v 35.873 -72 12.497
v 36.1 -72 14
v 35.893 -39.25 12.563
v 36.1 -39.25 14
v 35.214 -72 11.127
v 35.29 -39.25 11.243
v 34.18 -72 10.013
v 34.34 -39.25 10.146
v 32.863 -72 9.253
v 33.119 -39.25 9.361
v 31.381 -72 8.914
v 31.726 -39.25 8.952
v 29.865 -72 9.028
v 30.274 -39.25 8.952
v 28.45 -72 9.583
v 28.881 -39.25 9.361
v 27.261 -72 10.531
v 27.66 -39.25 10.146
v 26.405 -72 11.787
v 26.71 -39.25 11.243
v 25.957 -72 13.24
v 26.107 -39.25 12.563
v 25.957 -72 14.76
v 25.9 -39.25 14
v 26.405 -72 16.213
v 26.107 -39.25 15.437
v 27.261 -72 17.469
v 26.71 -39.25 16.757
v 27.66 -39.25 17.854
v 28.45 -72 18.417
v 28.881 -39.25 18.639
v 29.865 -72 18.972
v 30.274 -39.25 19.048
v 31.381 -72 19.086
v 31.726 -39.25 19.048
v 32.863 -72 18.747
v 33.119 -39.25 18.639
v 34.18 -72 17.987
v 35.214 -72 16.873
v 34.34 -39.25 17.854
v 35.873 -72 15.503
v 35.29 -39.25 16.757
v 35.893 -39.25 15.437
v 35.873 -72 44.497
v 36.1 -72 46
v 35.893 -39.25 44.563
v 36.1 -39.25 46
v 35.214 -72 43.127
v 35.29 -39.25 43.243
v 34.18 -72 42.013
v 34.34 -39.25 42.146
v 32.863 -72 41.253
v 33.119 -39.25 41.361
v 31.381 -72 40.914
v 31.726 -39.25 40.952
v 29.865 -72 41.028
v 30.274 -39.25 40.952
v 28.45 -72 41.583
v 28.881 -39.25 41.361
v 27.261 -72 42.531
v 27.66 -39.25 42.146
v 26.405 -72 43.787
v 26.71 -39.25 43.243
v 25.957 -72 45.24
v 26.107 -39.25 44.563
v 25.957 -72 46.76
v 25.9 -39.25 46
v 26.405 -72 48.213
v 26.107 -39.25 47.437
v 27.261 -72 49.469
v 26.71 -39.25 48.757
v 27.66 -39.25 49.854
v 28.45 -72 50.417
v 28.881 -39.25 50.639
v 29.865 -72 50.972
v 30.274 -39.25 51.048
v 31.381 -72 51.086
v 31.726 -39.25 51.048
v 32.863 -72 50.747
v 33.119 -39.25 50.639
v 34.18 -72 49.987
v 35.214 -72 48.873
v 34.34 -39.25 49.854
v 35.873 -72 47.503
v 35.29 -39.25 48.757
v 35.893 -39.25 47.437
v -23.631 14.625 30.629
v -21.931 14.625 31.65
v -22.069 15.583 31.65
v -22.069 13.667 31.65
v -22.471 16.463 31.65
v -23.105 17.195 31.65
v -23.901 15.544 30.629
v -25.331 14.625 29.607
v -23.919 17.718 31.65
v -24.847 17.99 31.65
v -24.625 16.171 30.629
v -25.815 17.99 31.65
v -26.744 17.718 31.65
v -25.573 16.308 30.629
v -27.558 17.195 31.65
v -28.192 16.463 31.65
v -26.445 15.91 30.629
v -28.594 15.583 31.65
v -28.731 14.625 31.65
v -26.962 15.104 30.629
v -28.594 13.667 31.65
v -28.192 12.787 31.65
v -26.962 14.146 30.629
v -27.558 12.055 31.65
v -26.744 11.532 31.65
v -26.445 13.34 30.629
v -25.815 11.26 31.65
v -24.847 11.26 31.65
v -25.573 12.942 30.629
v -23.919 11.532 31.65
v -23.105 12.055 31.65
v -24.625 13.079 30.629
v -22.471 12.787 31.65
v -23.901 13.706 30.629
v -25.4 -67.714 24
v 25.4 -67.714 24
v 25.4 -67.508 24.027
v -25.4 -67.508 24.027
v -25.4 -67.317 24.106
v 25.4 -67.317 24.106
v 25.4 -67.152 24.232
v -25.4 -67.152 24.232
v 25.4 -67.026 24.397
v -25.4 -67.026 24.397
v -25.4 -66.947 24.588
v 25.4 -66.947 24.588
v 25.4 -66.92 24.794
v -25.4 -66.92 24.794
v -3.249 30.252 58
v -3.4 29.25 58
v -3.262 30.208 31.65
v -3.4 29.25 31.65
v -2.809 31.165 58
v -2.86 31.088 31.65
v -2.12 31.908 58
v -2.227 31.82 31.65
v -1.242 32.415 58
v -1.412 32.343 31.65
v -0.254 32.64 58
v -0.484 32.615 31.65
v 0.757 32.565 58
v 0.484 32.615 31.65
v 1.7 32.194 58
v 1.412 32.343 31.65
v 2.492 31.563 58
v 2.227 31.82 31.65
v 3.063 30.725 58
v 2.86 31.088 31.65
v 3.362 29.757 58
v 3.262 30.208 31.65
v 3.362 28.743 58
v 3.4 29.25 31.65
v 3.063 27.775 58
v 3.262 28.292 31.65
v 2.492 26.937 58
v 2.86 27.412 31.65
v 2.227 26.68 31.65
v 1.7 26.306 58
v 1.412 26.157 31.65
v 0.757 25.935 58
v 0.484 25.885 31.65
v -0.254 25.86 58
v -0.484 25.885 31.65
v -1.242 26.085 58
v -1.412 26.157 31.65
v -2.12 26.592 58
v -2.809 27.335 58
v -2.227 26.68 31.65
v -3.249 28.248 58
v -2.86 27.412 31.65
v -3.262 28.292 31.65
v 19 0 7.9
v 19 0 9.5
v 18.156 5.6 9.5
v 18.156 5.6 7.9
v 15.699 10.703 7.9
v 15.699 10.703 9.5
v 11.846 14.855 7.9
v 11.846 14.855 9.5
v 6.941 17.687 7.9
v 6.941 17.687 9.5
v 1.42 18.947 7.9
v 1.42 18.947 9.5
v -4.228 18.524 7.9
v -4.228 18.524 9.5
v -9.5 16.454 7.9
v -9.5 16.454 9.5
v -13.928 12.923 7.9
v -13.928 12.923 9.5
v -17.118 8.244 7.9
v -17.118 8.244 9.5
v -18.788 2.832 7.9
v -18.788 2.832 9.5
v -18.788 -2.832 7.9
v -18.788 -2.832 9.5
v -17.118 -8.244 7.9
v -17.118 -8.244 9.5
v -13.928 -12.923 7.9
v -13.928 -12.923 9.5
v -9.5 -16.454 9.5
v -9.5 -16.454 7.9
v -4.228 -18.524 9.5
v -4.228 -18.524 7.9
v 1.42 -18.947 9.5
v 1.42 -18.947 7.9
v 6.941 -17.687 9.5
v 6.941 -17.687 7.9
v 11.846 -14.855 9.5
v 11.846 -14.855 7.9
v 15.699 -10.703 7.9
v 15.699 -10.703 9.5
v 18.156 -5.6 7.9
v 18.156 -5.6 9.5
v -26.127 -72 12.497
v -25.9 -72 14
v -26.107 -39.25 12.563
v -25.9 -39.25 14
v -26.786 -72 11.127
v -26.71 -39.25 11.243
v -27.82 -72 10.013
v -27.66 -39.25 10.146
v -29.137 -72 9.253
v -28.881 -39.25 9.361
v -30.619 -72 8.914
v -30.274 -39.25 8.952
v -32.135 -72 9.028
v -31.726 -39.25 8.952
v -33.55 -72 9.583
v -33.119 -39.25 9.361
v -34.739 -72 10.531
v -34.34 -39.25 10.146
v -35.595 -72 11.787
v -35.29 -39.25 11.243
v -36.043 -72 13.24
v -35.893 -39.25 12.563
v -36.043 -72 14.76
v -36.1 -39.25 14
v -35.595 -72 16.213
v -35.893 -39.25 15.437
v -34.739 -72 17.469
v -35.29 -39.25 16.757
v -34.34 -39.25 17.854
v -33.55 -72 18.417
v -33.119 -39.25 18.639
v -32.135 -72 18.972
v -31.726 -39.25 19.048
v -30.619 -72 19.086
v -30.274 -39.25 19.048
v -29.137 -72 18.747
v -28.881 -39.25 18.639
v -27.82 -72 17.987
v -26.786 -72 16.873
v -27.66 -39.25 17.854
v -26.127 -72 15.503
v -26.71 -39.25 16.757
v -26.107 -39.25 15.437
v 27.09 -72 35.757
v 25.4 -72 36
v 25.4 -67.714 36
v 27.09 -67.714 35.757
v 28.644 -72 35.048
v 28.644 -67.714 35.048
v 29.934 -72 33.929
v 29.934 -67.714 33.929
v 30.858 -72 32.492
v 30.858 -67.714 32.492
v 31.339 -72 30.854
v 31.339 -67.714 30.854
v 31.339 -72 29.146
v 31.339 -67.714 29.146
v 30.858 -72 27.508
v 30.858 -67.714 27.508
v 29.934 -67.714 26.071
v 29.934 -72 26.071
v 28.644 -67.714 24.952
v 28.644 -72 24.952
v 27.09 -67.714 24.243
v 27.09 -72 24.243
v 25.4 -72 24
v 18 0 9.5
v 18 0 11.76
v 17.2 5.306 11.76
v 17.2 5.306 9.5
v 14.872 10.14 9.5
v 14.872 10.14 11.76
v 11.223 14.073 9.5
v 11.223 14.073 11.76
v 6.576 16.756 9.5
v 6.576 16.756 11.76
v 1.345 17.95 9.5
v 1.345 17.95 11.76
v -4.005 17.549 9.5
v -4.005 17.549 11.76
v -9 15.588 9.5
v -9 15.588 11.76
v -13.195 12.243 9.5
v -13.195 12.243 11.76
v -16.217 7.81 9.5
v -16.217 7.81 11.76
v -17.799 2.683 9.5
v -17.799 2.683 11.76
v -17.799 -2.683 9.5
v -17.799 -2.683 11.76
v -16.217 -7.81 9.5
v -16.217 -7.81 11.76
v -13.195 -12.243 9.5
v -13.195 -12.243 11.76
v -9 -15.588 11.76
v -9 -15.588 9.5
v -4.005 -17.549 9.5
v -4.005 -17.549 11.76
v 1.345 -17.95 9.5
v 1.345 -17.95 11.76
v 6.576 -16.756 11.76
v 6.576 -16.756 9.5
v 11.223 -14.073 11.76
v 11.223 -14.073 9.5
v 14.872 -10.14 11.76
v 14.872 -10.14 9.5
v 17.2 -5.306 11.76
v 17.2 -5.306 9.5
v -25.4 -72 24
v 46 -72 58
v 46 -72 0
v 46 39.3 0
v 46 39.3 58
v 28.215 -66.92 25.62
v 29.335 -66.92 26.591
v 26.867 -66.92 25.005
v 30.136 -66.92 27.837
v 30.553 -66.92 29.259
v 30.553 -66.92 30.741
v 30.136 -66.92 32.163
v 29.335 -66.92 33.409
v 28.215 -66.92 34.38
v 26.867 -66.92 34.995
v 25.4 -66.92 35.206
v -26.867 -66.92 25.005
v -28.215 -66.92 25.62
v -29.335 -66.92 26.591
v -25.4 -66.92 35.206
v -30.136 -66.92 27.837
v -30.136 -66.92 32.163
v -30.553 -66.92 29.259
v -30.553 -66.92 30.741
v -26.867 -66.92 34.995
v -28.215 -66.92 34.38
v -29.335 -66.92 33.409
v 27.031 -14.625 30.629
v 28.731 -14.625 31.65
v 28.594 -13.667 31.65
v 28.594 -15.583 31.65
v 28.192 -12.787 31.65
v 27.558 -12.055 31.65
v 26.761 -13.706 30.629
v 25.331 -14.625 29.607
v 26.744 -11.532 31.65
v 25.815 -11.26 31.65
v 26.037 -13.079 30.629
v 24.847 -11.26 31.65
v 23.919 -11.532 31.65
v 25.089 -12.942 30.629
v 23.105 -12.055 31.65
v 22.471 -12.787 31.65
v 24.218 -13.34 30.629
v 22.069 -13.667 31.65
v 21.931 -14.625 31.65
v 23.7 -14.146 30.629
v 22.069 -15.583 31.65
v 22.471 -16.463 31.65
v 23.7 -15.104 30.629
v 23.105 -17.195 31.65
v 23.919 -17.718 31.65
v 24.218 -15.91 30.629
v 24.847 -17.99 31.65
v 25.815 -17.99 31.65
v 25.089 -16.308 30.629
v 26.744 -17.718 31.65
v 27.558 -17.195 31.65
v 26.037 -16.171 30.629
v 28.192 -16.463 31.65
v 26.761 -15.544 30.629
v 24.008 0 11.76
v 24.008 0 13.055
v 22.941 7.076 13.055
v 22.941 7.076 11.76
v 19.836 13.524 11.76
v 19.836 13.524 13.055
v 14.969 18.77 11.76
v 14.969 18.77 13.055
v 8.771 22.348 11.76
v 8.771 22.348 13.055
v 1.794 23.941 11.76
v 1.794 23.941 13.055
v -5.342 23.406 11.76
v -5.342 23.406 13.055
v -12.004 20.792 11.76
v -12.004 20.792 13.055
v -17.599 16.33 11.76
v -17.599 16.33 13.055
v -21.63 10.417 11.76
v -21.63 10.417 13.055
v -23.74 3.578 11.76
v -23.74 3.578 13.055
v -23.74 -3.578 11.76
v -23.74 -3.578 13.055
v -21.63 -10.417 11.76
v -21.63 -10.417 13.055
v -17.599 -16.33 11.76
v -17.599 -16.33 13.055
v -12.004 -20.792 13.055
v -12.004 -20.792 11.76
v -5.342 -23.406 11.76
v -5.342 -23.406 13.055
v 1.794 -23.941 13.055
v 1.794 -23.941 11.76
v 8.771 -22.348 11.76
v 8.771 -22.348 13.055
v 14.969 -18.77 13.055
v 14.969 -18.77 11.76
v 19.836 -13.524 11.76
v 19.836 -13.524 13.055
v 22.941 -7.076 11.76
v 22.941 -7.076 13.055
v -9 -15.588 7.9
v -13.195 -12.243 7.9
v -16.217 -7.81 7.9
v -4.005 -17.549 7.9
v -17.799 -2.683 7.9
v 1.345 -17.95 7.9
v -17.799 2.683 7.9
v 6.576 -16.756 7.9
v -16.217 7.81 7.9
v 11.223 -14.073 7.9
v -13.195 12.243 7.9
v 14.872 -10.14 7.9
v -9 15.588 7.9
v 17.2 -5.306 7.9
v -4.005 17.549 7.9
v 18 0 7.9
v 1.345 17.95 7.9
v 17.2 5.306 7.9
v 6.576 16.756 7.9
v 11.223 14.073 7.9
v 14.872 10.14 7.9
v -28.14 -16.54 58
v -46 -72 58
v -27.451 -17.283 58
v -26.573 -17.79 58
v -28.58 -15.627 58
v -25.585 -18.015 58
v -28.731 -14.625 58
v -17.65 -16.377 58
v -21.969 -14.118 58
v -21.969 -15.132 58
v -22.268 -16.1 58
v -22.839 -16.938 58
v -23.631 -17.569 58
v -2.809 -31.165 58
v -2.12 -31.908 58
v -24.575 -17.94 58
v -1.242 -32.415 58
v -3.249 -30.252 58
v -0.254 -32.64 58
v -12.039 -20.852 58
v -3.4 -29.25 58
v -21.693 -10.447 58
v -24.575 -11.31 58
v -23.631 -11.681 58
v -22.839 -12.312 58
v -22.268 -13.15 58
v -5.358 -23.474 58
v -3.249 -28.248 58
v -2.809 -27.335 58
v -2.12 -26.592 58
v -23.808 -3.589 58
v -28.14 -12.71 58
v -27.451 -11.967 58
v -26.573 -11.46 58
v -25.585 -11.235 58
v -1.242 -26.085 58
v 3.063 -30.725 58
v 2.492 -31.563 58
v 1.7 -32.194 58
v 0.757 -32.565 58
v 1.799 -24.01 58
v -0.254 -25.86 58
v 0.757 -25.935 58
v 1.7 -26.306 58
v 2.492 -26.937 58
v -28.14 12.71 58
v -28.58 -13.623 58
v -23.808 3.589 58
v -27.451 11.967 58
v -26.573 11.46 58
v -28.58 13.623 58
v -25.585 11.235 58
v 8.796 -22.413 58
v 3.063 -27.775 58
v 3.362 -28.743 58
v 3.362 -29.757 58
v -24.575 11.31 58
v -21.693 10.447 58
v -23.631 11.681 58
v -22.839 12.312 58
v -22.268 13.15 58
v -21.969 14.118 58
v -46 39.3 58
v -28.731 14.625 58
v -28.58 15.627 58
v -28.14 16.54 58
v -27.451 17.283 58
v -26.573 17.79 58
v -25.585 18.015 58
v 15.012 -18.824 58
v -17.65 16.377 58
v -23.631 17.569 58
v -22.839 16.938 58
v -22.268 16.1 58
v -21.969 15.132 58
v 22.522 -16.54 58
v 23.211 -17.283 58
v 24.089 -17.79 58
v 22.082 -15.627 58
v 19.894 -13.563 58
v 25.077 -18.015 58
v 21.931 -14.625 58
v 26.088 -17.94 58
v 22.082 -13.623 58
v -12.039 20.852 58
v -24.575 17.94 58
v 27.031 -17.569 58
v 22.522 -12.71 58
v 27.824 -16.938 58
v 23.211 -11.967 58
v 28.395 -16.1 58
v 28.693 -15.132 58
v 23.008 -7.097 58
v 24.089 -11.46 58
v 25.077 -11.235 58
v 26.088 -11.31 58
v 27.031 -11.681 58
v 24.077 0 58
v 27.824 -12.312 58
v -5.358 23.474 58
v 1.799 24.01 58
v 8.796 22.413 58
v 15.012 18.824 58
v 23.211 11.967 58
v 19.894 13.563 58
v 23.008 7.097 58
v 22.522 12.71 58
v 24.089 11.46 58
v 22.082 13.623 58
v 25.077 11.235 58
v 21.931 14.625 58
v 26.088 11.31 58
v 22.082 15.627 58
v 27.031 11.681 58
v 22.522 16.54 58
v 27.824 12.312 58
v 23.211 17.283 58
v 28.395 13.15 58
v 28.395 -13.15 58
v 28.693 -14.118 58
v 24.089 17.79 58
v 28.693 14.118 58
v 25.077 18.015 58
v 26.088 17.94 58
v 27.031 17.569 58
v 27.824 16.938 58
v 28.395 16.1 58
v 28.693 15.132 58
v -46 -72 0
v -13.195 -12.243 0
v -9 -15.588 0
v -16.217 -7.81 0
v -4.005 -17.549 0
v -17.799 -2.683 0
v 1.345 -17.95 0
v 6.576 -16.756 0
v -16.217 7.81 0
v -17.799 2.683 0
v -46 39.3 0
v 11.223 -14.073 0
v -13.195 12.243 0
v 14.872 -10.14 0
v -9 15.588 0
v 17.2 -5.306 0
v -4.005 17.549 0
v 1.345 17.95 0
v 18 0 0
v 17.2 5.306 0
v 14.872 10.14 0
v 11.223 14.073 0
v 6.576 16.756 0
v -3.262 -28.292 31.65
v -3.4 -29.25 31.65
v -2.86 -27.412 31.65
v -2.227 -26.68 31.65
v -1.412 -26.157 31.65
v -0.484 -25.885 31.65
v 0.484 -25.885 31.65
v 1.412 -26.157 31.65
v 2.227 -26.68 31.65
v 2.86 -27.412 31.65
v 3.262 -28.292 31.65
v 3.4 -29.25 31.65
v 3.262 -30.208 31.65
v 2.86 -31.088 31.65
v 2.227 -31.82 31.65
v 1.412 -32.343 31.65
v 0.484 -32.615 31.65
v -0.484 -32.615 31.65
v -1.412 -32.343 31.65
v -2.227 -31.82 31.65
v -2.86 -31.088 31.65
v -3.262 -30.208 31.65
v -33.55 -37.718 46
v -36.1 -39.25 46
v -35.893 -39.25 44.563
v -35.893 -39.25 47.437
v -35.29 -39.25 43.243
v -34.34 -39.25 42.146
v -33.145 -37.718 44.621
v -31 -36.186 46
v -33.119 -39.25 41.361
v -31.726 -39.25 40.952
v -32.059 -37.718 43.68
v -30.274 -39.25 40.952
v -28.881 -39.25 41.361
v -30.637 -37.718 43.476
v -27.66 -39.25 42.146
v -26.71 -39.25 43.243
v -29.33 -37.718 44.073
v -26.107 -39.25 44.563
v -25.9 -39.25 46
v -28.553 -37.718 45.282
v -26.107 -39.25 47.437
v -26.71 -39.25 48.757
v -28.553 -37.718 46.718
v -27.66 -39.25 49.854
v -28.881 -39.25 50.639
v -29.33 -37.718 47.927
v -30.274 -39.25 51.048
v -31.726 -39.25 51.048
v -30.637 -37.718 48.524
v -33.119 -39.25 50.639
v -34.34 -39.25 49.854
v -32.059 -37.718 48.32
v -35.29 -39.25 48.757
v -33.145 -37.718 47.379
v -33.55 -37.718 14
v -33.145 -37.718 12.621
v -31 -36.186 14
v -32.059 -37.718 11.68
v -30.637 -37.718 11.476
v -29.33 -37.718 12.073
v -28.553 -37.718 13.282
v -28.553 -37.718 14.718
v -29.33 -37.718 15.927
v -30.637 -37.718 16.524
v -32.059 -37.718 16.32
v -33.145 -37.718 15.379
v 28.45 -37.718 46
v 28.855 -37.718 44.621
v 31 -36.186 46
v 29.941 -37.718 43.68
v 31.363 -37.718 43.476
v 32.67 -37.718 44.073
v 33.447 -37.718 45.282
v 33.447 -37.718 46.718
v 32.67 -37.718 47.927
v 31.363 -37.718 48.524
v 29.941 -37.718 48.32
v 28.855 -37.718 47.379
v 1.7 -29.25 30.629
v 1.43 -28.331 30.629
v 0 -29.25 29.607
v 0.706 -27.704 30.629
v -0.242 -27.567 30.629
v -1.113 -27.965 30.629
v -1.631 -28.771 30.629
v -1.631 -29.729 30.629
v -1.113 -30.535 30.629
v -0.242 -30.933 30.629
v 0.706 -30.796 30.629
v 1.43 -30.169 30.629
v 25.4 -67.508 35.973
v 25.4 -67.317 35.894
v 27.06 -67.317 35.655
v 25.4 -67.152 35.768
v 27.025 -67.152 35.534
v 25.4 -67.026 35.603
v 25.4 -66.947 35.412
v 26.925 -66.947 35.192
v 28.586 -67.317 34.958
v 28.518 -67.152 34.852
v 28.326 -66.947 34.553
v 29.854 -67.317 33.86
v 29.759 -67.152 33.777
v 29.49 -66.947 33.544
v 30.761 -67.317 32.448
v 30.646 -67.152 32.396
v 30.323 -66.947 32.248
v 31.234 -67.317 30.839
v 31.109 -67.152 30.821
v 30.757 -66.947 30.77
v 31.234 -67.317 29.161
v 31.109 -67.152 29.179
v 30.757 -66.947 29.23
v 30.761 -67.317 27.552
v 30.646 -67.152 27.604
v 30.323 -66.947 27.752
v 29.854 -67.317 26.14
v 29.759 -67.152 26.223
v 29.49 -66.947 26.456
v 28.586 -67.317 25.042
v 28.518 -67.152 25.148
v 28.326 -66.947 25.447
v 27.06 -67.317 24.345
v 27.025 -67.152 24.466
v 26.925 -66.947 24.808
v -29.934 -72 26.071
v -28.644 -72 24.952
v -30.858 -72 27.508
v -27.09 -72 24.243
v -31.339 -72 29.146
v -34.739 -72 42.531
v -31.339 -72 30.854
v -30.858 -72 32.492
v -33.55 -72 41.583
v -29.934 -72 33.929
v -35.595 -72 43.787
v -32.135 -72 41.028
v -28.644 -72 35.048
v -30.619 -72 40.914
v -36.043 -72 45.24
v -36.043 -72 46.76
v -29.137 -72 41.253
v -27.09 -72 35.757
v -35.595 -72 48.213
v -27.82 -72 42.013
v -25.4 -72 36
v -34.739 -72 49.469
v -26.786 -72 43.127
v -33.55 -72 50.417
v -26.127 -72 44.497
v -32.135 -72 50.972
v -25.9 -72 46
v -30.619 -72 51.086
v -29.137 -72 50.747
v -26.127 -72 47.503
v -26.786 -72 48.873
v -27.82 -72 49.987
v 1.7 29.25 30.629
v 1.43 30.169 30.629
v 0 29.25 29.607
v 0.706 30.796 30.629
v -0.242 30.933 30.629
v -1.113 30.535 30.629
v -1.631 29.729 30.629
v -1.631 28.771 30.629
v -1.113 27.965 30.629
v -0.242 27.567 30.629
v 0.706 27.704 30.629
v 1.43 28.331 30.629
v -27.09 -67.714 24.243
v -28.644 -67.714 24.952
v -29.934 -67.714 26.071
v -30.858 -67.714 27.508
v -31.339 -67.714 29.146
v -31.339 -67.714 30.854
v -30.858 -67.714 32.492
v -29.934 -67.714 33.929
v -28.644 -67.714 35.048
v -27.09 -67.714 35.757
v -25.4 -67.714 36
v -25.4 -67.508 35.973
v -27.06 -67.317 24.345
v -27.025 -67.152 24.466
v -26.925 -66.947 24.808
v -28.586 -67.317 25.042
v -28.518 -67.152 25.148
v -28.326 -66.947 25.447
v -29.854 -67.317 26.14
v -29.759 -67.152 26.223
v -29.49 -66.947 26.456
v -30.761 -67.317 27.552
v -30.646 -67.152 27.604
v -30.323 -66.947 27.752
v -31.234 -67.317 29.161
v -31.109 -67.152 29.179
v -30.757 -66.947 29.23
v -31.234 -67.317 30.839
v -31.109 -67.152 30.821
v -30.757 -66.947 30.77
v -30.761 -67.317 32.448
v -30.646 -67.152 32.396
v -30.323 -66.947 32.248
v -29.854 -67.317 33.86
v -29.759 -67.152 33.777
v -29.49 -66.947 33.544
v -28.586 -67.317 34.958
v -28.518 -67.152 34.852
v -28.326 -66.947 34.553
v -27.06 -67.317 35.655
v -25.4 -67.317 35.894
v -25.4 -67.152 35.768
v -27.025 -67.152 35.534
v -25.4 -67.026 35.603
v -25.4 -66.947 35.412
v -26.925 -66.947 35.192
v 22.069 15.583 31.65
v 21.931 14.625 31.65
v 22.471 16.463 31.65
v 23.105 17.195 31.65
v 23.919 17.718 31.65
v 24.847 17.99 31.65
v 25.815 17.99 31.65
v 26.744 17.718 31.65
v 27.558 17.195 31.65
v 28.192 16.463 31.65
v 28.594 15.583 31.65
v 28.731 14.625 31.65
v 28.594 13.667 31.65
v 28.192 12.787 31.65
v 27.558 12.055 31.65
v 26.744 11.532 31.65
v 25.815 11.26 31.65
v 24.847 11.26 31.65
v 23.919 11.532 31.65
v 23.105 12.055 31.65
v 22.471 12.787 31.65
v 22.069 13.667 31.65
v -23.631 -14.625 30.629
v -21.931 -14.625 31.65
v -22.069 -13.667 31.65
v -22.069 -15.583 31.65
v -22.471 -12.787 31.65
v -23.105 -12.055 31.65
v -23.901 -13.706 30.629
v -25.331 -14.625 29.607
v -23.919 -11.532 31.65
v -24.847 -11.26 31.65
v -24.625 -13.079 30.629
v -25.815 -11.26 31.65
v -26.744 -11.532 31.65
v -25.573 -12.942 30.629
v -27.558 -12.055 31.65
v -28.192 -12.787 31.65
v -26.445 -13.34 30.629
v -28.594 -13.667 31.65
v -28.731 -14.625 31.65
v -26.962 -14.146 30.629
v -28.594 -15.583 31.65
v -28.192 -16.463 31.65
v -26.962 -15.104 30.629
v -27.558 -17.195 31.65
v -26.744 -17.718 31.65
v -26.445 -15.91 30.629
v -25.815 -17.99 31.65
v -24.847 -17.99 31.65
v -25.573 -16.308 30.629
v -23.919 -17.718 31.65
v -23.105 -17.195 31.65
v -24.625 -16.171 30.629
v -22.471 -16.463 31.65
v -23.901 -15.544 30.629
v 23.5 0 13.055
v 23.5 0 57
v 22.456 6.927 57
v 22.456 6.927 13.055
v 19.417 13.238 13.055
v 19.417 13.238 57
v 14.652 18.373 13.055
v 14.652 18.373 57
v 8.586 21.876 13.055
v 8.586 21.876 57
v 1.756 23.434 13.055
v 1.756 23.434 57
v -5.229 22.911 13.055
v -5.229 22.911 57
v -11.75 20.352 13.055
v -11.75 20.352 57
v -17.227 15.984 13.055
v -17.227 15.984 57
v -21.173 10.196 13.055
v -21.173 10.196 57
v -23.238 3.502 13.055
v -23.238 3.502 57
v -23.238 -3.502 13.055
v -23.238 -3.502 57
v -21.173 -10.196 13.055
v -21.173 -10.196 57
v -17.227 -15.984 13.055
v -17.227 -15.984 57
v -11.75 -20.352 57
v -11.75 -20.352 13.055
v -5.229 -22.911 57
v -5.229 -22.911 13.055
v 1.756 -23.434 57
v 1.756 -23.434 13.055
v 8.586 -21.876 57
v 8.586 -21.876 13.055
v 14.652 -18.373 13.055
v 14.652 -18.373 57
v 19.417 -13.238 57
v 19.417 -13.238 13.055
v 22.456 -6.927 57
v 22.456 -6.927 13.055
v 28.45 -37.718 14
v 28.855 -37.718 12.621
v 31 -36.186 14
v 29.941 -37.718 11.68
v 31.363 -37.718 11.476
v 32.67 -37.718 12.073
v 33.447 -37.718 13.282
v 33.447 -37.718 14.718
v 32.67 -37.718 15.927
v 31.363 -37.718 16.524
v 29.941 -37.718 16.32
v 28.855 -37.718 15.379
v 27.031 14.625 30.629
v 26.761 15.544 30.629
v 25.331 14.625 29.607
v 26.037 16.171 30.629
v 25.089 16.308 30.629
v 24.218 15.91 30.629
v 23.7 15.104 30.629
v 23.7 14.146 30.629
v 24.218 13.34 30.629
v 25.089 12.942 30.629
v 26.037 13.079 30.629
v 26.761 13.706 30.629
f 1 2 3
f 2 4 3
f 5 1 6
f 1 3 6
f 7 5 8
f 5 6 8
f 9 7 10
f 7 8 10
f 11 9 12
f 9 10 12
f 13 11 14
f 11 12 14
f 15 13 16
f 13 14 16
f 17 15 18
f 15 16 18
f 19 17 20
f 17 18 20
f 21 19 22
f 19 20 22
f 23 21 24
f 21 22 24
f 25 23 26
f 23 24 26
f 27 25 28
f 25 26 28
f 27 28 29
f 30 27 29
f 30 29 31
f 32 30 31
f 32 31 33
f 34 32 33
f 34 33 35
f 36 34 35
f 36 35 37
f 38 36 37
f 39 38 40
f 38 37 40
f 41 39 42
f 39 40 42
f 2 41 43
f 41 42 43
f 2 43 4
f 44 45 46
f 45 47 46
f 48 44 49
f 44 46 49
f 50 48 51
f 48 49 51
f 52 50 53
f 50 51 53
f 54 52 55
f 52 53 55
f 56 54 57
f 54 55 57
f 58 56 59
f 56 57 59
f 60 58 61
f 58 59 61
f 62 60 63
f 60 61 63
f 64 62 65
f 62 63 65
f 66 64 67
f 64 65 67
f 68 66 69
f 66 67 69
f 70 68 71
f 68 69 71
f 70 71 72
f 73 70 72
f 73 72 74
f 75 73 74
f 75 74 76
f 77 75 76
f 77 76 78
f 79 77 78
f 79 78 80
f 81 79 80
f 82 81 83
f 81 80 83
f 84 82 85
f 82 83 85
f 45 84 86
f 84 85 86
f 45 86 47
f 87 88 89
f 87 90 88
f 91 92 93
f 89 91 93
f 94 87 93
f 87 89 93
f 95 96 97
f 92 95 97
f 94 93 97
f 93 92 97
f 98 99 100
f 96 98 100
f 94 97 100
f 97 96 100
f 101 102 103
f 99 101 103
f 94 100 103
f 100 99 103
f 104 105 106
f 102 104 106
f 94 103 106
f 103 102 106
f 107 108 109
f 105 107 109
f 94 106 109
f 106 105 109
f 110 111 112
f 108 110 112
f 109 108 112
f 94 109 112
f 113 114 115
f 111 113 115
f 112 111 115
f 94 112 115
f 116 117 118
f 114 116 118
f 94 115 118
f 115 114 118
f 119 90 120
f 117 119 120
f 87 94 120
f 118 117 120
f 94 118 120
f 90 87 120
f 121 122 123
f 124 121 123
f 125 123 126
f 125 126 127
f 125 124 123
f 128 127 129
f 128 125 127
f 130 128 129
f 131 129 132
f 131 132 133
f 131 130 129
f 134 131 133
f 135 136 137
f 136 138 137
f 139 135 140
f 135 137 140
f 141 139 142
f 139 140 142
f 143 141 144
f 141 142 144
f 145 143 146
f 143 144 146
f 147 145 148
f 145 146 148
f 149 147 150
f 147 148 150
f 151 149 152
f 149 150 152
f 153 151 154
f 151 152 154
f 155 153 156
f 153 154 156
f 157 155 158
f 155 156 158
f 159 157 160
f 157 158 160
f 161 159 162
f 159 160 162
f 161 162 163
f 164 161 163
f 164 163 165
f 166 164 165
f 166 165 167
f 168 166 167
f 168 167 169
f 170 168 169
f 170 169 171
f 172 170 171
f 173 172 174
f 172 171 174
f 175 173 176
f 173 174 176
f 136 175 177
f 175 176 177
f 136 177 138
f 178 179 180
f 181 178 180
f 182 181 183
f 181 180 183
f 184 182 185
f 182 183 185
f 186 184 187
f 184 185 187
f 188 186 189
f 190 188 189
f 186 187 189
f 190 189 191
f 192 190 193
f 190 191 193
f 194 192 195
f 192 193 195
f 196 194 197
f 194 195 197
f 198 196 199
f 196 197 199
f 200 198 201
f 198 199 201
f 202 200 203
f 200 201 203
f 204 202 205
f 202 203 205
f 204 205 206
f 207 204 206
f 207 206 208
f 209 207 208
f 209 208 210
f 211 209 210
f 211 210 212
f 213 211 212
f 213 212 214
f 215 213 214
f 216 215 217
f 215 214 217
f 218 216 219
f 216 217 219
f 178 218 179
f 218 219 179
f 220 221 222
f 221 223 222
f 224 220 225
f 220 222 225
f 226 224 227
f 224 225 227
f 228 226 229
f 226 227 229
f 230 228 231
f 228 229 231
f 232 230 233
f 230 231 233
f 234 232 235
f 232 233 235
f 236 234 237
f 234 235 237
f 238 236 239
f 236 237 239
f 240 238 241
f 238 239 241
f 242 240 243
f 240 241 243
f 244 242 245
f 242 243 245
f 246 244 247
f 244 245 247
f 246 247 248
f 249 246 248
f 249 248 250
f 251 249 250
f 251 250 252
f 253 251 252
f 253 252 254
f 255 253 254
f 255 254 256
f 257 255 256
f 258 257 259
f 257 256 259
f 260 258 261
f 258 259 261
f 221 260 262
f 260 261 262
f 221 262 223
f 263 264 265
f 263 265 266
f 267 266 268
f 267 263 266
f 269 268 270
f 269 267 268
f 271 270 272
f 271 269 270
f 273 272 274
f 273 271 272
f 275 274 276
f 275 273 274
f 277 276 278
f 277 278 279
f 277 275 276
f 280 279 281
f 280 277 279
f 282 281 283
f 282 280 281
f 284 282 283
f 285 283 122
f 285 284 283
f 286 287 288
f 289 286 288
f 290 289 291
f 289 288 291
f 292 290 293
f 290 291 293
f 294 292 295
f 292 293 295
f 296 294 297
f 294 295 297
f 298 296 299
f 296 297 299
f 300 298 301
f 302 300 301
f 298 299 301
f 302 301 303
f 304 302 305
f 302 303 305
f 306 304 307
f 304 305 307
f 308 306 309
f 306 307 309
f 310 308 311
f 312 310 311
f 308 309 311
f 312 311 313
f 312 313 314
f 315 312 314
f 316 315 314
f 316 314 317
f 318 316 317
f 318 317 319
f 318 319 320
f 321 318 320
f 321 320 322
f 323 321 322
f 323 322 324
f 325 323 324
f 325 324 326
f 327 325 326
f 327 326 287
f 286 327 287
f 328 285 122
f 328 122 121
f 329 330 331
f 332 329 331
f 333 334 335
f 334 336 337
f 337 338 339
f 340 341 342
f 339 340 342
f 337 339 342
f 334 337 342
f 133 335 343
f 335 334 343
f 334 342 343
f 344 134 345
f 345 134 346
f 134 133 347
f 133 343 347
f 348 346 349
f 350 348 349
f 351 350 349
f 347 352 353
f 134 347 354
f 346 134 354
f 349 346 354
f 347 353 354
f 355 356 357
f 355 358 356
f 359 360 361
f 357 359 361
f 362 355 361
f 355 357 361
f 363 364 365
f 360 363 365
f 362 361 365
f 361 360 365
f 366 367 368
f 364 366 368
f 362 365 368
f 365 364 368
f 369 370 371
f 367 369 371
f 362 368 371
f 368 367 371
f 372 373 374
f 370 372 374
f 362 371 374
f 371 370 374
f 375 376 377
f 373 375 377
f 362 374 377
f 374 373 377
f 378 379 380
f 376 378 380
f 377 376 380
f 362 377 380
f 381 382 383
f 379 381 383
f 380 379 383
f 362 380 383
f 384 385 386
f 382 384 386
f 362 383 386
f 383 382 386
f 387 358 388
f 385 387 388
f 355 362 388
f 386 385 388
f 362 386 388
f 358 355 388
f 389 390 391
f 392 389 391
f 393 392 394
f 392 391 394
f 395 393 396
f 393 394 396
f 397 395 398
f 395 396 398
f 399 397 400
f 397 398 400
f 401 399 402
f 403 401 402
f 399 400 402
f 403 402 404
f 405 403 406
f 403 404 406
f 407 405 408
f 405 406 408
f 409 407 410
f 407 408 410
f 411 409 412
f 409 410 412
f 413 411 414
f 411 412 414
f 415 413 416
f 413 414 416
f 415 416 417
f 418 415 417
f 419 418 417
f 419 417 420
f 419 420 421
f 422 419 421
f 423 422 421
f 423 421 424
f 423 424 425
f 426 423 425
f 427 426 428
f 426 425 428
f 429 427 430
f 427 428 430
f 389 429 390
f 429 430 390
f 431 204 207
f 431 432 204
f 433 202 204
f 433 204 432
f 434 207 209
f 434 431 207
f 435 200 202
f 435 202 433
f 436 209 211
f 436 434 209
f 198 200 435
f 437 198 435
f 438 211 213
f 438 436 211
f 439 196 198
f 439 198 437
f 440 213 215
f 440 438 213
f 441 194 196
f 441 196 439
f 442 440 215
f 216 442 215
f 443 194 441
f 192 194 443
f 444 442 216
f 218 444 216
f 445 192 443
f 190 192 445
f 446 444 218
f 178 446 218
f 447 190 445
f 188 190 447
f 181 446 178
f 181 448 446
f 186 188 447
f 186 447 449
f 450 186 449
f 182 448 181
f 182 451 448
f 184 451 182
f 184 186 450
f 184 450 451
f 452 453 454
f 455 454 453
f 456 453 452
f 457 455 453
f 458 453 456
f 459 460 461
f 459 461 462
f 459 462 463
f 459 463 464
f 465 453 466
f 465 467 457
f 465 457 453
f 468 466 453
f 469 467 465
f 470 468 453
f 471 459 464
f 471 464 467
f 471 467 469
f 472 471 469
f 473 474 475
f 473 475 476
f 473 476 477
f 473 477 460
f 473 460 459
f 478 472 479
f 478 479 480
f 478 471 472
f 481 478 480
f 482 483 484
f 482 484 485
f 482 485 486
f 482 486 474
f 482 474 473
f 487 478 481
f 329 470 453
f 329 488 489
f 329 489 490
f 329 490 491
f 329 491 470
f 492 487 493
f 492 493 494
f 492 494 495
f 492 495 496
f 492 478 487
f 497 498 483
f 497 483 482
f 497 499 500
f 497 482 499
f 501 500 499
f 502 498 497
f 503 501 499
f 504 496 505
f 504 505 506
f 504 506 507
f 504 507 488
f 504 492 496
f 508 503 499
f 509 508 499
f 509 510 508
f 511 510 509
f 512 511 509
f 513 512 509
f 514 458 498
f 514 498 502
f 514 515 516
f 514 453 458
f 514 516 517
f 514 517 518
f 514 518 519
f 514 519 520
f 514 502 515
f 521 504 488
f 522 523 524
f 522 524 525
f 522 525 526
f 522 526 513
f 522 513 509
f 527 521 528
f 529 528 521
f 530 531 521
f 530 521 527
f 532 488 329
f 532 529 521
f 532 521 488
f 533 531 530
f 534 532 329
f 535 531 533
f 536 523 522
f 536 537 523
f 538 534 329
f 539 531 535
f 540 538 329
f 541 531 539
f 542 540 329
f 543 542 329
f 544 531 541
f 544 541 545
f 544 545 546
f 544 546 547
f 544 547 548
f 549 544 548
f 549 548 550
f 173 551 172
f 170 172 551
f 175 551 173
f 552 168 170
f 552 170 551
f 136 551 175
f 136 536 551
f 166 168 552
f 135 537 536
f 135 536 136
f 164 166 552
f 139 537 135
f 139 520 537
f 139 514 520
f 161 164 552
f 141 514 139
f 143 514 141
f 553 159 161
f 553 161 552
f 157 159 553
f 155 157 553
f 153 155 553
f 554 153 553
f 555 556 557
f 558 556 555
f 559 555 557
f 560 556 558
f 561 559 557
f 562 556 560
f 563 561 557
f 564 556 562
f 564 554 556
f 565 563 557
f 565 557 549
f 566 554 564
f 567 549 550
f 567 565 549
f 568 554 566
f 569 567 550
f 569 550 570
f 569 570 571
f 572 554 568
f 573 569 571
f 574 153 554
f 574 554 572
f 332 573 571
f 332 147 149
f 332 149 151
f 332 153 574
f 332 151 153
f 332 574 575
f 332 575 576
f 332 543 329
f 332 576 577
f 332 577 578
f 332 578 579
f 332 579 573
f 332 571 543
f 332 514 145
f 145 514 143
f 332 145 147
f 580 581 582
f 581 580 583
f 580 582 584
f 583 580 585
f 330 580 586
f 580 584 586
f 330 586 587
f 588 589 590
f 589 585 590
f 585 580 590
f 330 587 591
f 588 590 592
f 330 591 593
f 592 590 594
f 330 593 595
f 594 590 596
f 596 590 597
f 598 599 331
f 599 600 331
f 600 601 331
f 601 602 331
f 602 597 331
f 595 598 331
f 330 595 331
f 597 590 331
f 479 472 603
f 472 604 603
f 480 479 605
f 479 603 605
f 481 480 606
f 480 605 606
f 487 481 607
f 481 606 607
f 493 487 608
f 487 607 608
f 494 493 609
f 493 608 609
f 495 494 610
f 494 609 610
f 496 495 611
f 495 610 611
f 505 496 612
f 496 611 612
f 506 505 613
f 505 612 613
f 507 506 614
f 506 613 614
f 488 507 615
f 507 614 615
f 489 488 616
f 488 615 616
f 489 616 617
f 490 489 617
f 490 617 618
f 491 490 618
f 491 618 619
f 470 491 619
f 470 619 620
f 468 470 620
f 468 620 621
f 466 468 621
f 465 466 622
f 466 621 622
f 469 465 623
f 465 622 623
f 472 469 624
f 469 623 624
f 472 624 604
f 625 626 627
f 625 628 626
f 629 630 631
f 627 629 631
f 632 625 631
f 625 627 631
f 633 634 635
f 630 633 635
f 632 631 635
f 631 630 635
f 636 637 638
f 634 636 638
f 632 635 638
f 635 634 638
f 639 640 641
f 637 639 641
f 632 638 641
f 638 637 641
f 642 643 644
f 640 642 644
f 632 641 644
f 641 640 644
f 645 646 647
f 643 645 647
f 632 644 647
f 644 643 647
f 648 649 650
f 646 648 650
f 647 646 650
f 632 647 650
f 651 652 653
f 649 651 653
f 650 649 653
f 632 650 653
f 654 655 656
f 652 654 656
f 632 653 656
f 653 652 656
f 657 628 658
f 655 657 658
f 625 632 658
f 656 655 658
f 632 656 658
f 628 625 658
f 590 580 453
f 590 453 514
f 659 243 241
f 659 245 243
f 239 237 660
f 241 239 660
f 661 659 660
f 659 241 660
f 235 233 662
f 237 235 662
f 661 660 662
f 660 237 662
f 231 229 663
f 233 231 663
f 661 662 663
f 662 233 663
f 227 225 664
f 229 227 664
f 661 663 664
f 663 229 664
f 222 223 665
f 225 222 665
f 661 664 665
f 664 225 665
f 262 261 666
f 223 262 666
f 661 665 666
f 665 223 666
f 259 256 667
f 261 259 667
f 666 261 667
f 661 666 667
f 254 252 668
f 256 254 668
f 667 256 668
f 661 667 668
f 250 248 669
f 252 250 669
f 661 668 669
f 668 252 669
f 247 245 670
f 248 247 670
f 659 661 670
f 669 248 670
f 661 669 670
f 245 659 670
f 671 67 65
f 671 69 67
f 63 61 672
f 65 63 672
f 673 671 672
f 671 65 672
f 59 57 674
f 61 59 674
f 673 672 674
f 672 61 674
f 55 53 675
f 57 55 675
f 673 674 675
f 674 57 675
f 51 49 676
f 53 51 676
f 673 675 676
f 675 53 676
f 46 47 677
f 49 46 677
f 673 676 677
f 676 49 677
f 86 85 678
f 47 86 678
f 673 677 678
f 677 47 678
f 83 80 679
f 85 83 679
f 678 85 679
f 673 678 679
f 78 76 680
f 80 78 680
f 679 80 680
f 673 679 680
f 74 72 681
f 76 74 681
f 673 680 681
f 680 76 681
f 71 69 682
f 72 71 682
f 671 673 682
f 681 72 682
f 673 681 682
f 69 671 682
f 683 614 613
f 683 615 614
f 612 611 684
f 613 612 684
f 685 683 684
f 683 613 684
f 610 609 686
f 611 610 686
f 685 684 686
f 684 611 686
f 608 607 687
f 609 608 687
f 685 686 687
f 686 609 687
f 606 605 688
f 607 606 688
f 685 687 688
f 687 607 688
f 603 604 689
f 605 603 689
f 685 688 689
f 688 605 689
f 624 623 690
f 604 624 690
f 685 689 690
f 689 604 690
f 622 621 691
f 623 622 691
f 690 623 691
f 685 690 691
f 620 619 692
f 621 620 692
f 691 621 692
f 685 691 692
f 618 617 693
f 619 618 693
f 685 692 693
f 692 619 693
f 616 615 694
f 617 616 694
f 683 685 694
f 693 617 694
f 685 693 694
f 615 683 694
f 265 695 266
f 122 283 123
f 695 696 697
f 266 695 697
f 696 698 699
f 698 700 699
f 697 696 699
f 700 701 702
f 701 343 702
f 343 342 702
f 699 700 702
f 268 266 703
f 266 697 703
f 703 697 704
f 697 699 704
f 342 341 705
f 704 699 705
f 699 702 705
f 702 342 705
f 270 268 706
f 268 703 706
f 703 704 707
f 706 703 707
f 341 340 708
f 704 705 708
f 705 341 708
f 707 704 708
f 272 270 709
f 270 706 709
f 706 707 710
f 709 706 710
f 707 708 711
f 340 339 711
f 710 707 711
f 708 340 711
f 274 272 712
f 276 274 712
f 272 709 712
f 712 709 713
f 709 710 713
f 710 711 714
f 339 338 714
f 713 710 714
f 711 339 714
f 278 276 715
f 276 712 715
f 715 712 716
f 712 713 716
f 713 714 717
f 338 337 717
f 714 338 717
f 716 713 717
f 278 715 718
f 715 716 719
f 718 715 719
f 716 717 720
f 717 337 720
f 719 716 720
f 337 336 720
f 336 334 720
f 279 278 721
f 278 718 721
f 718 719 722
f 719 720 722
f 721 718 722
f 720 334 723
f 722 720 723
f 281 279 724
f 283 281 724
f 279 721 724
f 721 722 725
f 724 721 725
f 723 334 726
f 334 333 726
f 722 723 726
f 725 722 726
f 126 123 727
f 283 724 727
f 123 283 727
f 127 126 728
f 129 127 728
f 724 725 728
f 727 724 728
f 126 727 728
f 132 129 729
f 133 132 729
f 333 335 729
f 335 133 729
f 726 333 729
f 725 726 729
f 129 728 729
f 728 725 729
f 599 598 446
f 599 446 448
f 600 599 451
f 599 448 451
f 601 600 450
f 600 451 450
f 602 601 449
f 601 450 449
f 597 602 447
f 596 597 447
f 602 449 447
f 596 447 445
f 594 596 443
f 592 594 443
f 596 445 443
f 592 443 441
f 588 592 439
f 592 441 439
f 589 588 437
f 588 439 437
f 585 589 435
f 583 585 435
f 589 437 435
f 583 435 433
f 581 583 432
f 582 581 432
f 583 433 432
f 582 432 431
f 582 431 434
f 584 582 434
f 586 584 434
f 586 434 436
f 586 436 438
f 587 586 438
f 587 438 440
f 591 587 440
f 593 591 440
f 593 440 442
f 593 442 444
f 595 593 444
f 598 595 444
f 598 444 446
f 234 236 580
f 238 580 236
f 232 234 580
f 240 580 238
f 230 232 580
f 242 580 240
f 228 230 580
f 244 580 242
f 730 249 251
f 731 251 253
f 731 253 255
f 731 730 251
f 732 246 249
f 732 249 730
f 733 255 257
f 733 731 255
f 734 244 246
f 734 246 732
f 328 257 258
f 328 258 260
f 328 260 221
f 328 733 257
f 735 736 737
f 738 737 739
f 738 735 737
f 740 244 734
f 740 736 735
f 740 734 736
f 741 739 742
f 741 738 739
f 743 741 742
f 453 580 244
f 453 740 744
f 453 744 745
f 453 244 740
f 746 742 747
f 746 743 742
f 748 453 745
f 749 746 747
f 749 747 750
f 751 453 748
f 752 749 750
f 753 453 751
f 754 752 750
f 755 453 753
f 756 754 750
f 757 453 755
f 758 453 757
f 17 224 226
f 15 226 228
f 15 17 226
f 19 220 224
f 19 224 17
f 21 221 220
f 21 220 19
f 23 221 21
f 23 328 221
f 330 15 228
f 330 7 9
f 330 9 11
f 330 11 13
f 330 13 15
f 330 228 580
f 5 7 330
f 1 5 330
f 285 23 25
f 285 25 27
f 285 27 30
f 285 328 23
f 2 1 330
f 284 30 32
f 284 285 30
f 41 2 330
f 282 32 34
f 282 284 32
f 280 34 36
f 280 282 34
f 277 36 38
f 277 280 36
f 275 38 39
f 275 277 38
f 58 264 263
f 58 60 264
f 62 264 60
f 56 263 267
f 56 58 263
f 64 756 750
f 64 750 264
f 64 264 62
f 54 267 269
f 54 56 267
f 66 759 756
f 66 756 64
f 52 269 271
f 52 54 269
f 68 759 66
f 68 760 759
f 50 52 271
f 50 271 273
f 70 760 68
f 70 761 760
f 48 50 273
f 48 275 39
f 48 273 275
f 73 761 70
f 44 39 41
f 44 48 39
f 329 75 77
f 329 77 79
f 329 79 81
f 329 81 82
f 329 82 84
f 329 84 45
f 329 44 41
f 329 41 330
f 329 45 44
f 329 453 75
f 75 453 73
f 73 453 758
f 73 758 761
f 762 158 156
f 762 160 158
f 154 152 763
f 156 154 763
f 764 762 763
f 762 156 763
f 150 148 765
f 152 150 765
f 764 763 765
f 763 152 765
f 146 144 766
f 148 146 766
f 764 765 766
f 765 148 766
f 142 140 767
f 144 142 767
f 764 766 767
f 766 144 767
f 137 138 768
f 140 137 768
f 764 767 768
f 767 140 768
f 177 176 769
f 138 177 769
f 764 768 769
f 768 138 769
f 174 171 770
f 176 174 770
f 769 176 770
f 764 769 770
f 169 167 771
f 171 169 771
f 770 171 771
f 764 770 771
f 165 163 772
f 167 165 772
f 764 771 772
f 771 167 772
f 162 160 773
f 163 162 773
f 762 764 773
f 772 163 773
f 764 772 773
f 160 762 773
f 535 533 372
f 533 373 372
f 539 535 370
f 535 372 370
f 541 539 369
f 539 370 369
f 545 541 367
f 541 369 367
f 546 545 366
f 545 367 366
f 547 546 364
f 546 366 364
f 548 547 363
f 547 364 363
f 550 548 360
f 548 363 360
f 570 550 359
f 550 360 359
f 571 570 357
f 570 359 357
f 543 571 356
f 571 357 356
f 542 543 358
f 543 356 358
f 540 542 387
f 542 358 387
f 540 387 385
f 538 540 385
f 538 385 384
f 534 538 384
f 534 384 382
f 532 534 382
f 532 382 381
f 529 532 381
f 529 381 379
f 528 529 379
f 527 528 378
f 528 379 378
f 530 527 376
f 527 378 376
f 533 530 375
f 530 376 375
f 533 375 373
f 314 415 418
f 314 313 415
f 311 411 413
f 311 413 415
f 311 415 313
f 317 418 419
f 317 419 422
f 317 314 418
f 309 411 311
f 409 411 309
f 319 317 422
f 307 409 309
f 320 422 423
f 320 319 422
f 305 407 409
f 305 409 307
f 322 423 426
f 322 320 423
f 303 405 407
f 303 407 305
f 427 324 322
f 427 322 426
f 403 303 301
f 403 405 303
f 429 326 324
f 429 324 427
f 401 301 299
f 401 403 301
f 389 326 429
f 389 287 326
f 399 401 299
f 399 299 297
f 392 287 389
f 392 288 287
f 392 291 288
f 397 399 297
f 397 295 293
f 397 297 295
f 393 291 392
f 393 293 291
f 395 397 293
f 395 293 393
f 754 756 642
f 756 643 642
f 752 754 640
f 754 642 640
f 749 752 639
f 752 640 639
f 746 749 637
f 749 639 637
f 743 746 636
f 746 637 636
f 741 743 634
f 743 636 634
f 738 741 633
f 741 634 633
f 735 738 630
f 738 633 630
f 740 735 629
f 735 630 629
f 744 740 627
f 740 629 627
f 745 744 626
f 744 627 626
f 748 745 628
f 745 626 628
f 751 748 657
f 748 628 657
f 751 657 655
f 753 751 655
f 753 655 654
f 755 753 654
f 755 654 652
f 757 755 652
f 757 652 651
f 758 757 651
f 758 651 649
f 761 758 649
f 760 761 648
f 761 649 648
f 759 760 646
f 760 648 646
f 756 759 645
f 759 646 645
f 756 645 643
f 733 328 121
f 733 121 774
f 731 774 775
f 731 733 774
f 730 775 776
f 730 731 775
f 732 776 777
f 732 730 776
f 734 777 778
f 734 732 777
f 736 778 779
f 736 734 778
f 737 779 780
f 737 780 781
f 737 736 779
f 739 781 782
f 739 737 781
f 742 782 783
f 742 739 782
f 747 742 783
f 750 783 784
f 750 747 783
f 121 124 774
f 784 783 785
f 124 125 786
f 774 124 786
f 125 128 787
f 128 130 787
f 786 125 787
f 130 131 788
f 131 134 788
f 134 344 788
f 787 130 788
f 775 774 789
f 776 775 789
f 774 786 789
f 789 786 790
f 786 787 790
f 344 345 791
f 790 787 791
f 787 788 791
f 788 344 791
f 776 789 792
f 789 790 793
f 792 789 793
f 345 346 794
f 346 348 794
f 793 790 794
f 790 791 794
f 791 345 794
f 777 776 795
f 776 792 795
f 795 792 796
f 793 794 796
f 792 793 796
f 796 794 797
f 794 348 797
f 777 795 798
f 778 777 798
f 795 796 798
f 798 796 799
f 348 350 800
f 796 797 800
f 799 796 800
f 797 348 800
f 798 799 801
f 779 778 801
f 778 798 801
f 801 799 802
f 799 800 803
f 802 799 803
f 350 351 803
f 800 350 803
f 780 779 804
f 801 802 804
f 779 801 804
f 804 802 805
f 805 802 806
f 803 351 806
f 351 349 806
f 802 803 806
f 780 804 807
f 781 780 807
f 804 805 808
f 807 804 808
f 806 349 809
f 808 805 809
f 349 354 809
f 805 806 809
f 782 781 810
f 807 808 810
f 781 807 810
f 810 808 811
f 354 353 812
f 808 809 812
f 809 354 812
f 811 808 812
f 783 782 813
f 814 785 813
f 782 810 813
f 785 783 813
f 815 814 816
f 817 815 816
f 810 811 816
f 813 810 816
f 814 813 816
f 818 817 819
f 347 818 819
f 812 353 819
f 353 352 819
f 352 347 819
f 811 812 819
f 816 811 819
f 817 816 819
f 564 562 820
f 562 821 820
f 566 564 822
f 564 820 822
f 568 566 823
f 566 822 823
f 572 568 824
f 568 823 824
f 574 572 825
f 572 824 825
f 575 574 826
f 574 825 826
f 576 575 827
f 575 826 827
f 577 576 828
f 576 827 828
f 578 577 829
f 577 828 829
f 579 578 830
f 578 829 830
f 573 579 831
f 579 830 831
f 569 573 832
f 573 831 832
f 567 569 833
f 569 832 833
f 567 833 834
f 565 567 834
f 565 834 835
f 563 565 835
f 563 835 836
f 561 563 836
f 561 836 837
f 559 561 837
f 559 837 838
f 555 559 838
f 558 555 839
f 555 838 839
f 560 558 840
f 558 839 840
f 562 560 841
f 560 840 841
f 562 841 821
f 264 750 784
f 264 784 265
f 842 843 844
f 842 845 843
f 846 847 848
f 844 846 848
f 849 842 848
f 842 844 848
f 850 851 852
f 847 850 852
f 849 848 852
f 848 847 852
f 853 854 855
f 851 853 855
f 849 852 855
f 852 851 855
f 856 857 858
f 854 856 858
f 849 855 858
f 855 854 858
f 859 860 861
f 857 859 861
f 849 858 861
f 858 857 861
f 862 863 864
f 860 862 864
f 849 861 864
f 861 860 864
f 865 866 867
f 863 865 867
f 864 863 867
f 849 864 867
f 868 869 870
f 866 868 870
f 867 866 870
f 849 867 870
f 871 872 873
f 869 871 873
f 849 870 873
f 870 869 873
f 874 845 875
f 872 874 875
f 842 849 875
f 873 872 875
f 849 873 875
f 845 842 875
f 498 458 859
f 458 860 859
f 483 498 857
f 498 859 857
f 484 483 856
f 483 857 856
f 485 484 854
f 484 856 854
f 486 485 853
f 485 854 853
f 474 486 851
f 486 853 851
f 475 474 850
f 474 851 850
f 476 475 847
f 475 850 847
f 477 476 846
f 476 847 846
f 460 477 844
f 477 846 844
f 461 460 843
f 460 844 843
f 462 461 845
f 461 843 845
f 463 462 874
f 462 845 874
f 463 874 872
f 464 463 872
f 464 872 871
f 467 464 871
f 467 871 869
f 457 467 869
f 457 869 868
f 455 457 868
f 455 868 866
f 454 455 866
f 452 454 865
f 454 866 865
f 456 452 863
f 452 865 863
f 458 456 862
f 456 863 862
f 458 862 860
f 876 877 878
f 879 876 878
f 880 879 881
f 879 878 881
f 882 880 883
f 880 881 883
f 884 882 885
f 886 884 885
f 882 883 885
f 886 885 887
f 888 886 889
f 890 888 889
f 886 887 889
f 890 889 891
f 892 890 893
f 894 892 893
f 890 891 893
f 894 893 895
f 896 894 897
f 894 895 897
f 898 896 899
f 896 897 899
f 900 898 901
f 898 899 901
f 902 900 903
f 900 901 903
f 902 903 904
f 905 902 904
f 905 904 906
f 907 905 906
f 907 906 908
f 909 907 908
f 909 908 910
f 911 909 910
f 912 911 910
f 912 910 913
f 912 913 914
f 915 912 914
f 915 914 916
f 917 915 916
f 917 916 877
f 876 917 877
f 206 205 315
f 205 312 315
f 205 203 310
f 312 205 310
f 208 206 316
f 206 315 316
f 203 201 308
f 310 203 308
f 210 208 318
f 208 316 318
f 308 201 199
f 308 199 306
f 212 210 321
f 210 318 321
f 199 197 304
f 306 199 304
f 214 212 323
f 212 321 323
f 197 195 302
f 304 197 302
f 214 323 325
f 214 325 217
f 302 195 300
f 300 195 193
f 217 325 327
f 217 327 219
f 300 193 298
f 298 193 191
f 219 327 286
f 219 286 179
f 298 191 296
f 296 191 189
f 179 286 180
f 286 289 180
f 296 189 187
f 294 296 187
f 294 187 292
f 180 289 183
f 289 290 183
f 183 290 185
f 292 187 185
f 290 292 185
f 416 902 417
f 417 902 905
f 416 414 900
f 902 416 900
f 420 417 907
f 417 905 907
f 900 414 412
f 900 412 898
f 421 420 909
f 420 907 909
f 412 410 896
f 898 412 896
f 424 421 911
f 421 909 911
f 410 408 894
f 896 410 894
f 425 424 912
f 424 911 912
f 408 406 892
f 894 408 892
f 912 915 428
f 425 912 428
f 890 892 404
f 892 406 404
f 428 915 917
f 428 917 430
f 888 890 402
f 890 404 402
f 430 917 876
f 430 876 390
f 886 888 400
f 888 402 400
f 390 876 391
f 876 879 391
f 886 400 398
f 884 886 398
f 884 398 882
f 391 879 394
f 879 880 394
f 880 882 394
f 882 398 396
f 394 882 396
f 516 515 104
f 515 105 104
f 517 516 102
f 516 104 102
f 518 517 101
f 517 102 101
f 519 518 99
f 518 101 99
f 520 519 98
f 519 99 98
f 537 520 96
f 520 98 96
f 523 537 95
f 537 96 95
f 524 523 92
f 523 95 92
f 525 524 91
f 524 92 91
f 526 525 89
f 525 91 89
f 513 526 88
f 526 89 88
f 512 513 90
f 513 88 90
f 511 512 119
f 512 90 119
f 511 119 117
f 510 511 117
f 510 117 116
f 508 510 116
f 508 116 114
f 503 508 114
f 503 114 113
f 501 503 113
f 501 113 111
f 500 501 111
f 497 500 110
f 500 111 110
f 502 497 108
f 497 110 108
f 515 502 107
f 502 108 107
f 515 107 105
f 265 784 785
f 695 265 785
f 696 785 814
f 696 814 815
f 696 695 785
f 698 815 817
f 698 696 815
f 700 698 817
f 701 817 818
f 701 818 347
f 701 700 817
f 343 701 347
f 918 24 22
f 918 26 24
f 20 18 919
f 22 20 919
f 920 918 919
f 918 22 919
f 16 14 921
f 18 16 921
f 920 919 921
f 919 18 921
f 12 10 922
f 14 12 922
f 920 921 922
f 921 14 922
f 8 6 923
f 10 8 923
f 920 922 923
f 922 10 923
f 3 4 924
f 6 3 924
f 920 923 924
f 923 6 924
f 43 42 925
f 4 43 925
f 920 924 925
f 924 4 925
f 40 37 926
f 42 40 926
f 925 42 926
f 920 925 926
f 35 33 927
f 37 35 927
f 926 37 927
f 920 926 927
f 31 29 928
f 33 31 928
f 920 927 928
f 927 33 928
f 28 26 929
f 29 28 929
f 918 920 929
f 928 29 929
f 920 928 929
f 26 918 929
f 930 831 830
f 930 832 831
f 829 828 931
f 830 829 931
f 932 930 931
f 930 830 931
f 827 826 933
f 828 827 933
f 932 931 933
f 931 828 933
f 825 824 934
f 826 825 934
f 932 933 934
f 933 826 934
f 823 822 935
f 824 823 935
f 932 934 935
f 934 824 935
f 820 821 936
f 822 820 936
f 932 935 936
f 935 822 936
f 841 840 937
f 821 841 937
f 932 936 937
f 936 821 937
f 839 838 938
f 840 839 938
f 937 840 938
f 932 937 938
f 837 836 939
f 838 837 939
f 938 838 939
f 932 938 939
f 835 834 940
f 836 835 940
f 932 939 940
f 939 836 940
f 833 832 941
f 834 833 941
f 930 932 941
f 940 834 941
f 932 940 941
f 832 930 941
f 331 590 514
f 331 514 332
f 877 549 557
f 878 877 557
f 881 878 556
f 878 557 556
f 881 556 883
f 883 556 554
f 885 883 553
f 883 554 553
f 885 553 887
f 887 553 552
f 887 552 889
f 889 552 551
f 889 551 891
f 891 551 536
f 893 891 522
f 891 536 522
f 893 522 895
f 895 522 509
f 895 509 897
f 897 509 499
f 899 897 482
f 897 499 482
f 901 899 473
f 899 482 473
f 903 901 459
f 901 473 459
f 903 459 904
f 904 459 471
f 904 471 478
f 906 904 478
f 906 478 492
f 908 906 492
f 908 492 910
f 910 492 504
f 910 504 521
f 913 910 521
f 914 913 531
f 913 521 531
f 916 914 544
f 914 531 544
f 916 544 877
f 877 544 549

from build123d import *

# Parameters (mm, degrees)
SKETCH2_W              = 101.6
SKETCH2_H              = 114.3
BOSS_EXTRUDE1_DEPTH    = 63.5
SKETCH4_W              = 101.6
SKETCH4_H              = 5.5
CUT_EXTRUDE2_DEPTH     = 141.276084918
SKETCH6_W              = 101.6
SKETCH6_H              = 3
CUT_EXTRUDE4_DEPTH     = 108.56226104
SKETCH3_R              = 18
CUT_EXTRUDE1_DEPTH     = 106.492369392
SKETCH5_R              = 23.5
CUT_EXTRUDE3_DEPTH     = 46.24
M8_TAPPED_HOLE1_D      = 6.8
M8_TAPPED_HOLE1_DEPTH  = 26.35
M8_TAPPED_HOLE1_TIP    = 2.042926105
CHAMFER1_SIZE          = 1
CHAMFER1_SIZE2         = 0.577350269
CUT_EXTRUDE6_START     = -48.5
SKETCH9_R              = 19
CUT_EXTRUDE6_DEPTH     = 1.6
CUT_EXTRUDE7_DEPTH     = 5.08
M12_TAPPED_HOLE1_D     = 10.2
M12_TAPPED_HOLE1_DEPTH = 32.75
M12_TAPPED_HOLE1_TIP   = 3.064389157
SKETCH14_W             = 4.8
SKETCH14_H             = 111.3
CUT_EXTRUDE8_DEPTH     = 106.492369392
FILLET1_R              = 0.79375
CUT_EXTRUDE9_START     = 1.2954
SKETCH15_R             = 24.008
SKETCH15_R_2           = 23.5
CUT_EXTRUDE9_DEPTH     = 1.2954


with BuildPart() as part:
    # Sketch2 → Boss-Extrude1 (new body)
    with BuildSketch(Plane.XY):
        with Locations((0, -17.85)):
            Rectangle(SKETCH2_W, SKETCH2_H)
    extrude(amount=BOSS_EXTRUDE1_DEPTH)

    # Sketch4 → Cut-Extrude2 (cut, through all)
    with BuildSketch(Plane(origin=(0, 39.3, 0), x_dir=(1, 0, 0), z_dir=(0, 1, 0))):
        with Locations((0, -60.75)):
            Rectangle(SKETCH4_W, SKETCH4_H)
    extrude(amount=-CUT_EXTRUDE2_DEPTH, mode=Mode.SUBTRACT)

    # Sketch6 → Cut-Extrude4 (cut, through all)
    with BuildSketch(Plane.XY.offset(58)):
        with Locations((0, -73.5)):
            Rectangle(SKETCH6_W, SKETCH6_H)
    extrude(amount=-CUT_EXTRUDE4_DEPTH, mode=Mode.SUBTRACT)

    # Sketch3 → Cut-Extrude1 (cut, through all)
    with BuildSketch(Plane.XY.offset(58)):
        Circle(SKETCH3_R)
    extrude(amount=-CUT_EXTRUDE1_DEPTH, mode=Mode.SUBTRACT)

    # Sketch5 → Cut-Extrude3 (cut)
    with BuildSketch(Plane.XY.offset(58)):
        Circle(SKETCH5_R)
    extrude(amount=-CUT_EXTRUDE3_DEPTH, mode=Mode.SUBTRACT)

    # M8 Tapped Hole1
    with Locations(Plane.XY.offset(58)):
        with Locations((0, 29.25), (25.331243061, 14.625), (25.331243061, -14.625), (0, -29.25), (-25.331243061, -14.625), (-25.331243061, 14.625)):
            Hole(M8_TAPPED_HOLE1_D / 2, depth=M8_TAPPED_HOLE1_DEPTH)
            with Locations((0, 0, -(M8_TAPPED_HOLE1_DEPTH + M8_TAPPED_HOLE1_TIP / 2))):  # 118° drill point
                Cone(0, M8_TAPPED_HOLE1_D / 2, M8_TAPPED_HOLE1_TIP, mode=Mode.SUBTRACT)

    # Chamfer1
    chamfer1_edges = [part.edges().sort_by_distance(p)[0] for p in [
        (-23.5, 0, 58),
    ]]
    chamfer1_side = [part.faces().sort_by_distance(p)[0] for p in [
        (-23.5, 0, 34.88),
    ]]
    chamfer(chamfer1_edges, length=CHAMFER1_SIZE, length2=CHAMFER1_SIZE2, reference=chamfer1_side[0])

    # Sketch9 → Cut-Extrude6 (cut)
    with BuildSketch(Plane.XY.offset(58).offset(CUT_EXTRUDE6_START)):
        Circle(SKETCH9_R)
    extrude(amount=-CUT_EXTRUDE6_DEPTH, mode=Mode.SUBTRACT)

    # Sketch10 → Cut-Extrude7 (cut)
    with BuildSketch(Plane.XZ.offset(72)):
        with BuildLine():
            Line((-25.4, 36), (25.4, 36))
            ThreePointArc((25.4, 36), (31.4, 30), (25.4, 24))
            Line((25.4, 24), (-25.4, 24))
            ThreePointArc((-25.4, 24), (-31.4, 30), (-25.4, 36))
        make_face()
    extrude(amount=-CUT_EXTRUDE7_DEPTH, mode=Mode.SUBTRACT)

    # M12 Tapped Hole1
    with Locations(Plane(origin=(0, -72, 0), x_dir=(-1, 0, 0), z_dir=(0, -1, 0))):
        with Locations((31, -46), (-31, -46), (-31, -14), (31, -14)):
            Hole(M12_TAPPED_HOLE1_D / 2, depth=M12_TAPPED_HOLE1_DEPTH)
            with Locations((0, 0, -(M12_TAPPED_HOLE1_DEPTH + M12_TAPPED_HOLE1_TIP / 2))):  # 118° drill point
                Cone(0, M12_TAPPED_HOLE1_D / 2, M12_TAPPED_HOLE1_TIP, mode=Mode.SUBTRACT)

    # Sketch14 → Cut-Extrude8 (cut, through all)
    with BuildSketch(Plane(origin=(0, 0, 0), x_dir=(-1, 0, 0), z_dir=(0, 0, -1))):
        with Locations((-48.4, -16.35)):
            Rectangle(SKETCH14_W, SKETCH14_H)
        with Locations((48.4, -16.35)):
            Rectangle(SKETCH14_W, SKETCH14_H)
    extrude(amount=-CUT_EXTRUDE8_DEPTH, mode=Mode.SUBTRACT)

    # Fillet1
    fillet1_edges = [part.edges().sort_by_distance(p)[0] for p in [
        (-31.4, -66.92, 30),
        (0, -66.92, 36),
        (31.4, -66.92, 30),
        (0, -66.92, 24),
    ]]
    fillet(fillet1_edges, radius=FILLET1_R)

    # Sketch15 → Cut-Extrude9 (cut)
    with BuildSketch(Plane.XY.offset(11.76).offset(CUT_EXTRUDE9_START)):
        Circle(SKETCH15_R)
        Circle(SKETCH15_R_2, mode=Mode.SUBTRACT)
    extrude(amount=-CUT_EXTRUDE9_DEPTH, mode=Mode.SUBTRACT)


solid = part.part
